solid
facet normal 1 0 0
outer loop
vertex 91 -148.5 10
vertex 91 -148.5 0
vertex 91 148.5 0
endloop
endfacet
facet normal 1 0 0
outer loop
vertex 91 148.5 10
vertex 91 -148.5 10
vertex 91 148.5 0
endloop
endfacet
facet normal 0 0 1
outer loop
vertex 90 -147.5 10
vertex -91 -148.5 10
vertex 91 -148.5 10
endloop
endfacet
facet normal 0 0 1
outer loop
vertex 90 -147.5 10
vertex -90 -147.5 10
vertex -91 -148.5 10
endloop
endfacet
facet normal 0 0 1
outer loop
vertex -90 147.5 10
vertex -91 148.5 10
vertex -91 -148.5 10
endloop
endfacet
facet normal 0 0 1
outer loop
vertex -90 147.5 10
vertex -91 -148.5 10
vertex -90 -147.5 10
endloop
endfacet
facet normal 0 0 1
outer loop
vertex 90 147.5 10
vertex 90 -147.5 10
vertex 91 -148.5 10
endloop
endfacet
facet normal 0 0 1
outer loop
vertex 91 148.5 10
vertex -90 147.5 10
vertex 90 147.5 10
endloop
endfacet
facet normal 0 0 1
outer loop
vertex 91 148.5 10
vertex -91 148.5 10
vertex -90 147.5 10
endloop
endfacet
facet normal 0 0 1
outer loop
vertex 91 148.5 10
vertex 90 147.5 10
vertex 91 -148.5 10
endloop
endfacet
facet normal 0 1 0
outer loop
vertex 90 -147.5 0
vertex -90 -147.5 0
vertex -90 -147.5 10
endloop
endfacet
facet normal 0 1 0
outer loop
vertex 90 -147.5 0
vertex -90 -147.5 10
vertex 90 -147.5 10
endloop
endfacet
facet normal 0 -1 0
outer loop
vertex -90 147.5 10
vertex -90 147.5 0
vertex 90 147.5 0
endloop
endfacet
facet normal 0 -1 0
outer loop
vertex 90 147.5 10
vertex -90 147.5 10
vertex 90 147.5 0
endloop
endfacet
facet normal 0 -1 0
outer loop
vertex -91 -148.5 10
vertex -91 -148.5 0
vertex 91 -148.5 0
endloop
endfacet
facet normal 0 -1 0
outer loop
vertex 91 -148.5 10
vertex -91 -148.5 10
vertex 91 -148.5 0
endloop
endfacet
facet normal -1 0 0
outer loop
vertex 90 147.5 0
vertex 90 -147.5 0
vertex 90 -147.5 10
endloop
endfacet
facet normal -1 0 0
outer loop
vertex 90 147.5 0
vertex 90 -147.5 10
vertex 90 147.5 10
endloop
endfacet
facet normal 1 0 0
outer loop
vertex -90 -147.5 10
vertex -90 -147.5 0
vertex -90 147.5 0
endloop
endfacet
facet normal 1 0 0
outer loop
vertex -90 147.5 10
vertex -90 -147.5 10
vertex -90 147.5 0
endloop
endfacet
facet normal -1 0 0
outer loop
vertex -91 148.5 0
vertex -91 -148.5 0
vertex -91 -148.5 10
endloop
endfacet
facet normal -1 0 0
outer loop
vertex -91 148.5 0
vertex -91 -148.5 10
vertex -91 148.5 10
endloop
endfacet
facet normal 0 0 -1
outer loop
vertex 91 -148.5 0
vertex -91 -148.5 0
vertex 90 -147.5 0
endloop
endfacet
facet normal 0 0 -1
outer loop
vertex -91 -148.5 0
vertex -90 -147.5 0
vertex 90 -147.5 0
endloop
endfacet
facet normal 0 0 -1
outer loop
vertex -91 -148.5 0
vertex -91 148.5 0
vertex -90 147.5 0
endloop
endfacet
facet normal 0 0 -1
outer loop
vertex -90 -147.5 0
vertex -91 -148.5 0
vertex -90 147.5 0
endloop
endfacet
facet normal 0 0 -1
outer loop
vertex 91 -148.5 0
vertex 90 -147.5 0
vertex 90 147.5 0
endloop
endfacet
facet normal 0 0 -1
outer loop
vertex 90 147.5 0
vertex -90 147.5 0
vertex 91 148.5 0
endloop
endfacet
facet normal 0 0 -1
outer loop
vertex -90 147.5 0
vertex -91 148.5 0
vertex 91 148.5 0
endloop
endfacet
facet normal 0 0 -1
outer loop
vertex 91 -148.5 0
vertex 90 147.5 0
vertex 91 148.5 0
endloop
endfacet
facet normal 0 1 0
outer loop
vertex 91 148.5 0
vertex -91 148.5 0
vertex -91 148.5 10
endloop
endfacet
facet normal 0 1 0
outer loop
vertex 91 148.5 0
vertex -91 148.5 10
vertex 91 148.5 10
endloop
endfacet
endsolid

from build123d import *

# Parameters (mm, degrees)
ESBO_O1_W                = 182
ESBO_O1_H                = 297
ESBO_O1_W_2              = 180
ESBO_O1_H_2              = 295
RESSALTO_EXTRUS_O1_DEPTH = 10


with BuildPart() as part:
    # Esboço1 → Ressalto-extrusão1 (new body)
    with BuildSketch(Plane.XY):
        Rectangle(ESBO_O1_W, ESBO_O1_H)
        Rectangle(ESBO_O1_W_2, ESBO_O1_H_2, mode=Mode.SUBTRACT)
    extrude(amount=RESSALTO_EXTRUS_O1_DEPTH)


solid = part.part
